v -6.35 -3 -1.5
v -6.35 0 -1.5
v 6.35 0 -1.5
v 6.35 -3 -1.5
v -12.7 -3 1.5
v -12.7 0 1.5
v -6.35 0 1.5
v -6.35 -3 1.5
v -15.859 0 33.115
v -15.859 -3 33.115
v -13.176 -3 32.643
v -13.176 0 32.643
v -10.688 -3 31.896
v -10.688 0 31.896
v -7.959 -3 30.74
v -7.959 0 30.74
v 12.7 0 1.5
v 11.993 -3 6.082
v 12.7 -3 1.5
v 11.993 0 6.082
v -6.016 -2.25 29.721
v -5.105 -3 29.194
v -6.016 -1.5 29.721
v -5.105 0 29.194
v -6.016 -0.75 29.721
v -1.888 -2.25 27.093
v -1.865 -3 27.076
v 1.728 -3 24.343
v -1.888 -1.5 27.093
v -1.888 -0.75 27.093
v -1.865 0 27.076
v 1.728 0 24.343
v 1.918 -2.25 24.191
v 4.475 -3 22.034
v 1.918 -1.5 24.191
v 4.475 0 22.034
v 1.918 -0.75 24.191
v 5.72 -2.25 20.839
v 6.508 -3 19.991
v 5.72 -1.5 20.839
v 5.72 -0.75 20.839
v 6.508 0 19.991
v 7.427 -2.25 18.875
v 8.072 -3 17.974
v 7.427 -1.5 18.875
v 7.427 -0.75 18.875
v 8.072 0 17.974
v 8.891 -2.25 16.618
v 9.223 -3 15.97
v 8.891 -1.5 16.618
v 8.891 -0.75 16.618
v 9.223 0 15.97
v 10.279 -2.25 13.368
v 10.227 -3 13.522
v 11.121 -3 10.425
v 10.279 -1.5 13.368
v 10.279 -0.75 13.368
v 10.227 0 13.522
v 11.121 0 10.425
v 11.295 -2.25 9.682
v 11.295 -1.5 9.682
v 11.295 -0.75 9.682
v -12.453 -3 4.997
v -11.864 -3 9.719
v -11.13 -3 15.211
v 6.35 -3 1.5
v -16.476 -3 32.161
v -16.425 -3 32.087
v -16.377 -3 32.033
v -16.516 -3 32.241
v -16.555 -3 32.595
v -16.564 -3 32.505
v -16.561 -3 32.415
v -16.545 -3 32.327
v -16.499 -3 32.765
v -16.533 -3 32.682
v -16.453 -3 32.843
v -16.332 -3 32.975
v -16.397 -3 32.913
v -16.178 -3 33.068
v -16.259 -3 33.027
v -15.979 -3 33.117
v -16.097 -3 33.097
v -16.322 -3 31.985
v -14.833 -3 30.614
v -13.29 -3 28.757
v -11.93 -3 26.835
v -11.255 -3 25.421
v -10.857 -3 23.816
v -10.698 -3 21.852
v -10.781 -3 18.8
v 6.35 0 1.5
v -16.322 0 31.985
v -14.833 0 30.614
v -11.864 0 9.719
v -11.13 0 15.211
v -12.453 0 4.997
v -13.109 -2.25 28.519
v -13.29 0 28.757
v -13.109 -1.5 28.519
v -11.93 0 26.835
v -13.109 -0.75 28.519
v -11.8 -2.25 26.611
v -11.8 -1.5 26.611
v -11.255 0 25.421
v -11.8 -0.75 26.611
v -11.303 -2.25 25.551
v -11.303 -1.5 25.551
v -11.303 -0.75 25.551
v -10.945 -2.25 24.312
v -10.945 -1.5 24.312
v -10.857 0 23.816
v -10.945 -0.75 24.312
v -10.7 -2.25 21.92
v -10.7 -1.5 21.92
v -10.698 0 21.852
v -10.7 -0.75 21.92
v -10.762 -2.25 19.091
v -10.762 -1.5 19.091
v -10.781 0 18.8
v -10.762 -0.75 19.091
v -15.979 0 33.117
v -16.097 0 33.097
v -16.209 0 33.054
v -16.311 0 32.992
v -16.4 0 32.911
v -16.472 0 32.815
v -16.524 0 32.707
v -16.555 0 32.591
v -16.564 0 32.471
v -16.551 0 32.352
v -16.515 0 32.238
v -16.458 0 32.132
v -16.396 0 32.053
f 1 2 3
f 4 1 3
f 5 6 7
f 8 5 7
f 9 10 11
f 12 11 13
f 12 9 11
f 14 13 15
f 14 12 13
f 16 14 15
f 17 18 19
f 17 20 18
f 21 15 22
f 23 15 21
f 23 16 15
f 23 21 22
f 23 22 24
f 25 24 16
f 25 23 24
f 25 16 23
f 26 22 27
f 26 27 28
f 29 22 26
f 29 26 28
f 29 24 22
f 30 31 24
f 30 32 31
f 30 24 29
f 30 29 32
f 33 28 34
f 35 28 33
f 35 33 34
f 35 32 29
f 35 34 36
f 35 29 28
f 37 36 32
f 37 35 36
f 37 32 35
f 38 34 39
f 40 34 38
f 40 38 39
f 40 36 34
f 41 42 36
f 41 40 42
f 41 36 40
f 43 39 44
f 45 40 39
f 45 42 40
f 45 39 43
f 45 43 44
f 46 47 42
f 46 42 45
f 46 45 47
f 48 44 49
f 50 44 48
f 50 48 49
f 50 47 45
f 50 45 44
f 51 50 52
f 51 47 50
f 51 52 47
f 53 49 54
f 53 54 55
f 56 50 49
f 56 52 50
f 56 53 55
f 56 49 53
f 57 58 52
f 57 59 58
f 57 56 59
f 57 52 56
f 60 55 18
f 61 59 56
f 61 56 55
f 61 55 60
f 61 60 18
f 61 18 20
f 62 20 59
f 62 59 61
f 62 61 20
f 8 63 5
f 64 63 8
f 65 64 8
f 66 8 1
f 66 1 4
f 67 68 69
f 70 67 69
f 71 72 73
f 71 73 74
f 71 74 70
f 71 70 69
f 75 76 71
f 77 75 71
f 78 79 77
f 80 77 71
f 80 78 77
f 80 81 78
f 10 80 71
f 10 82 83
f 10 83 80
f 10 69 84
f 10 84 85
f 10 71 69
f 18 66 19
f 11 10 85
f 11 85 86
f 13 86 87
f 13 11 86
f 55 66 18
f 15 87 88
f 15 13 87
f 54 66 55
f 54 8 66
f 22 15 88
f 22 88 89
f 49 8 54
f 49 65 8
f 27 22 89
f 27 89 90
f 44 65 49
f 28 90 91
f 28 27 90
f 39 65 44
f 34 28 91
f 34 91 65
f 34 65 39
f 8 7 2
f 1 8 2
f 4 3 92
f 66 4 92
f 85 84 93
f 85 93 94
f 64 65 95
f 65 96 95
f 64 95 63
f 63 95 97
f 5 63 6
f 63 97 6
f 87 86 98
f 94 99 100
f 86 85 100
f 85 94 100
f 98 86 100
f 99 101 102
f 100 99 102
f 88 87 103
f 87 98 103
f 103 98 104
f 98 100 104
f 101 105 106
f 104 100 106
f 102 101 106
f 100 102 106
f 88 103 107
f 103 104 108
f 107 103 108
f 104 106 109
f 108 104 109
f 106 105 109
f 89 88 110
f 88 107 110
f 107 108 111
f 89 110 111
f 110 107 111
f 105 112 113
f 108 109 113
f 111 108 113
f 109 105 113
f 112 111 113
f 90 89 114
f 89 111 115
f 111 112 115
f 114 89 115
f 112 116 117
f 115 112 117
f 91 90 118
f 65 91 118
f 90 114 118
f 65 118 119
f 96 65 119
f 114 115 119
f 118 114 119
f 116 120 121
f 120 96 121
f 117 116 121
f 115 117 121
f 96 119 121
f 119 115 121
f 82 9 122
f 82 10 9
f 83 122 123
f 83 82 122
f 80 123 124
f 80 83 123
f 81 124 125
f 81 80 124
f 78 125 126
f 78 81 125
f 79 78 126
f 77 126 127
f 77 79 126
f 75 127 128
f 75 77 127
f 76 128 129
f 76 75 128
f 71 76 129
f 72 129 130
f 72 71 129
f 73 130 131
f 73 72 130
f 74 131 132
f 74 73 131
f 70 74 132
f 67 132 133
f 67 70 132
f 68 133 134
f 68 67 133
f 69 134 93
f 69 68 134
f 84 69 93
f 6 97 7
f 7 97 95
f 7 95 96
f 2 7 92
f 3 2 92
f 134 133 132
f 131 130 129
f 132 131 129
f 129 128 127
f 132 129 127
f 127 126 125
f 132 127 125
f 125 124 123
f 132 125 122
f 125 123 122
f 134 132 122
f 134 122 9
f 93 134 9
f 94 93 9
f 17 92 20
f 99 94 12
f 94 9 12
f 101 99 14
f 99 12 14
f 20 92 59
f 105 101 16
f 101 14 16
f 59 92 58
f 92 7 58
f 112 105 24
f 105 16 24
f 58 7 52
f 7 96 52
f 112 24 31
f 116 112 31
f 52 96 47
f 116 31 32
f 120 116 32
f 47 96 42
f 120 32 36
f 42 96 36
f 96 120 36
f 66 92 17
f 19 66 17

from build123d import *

# Parameters (mm, degrees)
F1_DEPTH = 3
F2_R     = 0.635


with BuildPart() as f1:
    # F0 (on Front) → F1 (new body)
    with BuildSketch(Plane.XZ):
        with BuildLine():
            Line((-6.35, 1.5), (-6.35, -1.5))
            Line((-6.35, -1.5), (6.35, -1.5))
            Line((6.35, -1.5), (6.35, 1.5))
            Line((6.35, 1.5), (12.7, 1.5))
            add(Edge.make_bspline(
                [(-18.2788185775, 33.25), (-13.3881829887, 33.249924231), (-5.9212908921, 30.2024959046), (1.9629046813, 24.292081617), (10.3732054955, 17.0859768265), (11.8753107125, 7.1481850282), (12.7, 1.5)],
                knots=[0, 0, 0, 0, 0.2581191303, 0.4828394971, 0.7146874282, 1, 1, 1, 1], degree=3))
            add(Edge.make_bspline(
                [(-18.2788185775, 33.25), (-15.7212212497, 31.9133304564), (-13.1275464315, 28.584811238), (-10.04593733, 24.3915865531), (-11.3759748072, 12.5093687933), (-12.586874571, 5.0211525088), (-12.7, 1.5)],
                knots=[0, 0, 0, 0, 0.2284214234, 0.4161195871, 0.7078631304, 1, 1, 1, 1], degree=3))
            Line((-12.7, 1.5), (-6.35, 1.5))
        make_face()
    extrude(amount=F1_DEPTH)

    # F2
    f2_edges = [f1.edges().sort_by_distance(p)[0] for p in [
        (-18.278819, -1.5, 33.25),
    ]]
    fillet(f2_edges, radius=F2_R)


solid = f1.part
